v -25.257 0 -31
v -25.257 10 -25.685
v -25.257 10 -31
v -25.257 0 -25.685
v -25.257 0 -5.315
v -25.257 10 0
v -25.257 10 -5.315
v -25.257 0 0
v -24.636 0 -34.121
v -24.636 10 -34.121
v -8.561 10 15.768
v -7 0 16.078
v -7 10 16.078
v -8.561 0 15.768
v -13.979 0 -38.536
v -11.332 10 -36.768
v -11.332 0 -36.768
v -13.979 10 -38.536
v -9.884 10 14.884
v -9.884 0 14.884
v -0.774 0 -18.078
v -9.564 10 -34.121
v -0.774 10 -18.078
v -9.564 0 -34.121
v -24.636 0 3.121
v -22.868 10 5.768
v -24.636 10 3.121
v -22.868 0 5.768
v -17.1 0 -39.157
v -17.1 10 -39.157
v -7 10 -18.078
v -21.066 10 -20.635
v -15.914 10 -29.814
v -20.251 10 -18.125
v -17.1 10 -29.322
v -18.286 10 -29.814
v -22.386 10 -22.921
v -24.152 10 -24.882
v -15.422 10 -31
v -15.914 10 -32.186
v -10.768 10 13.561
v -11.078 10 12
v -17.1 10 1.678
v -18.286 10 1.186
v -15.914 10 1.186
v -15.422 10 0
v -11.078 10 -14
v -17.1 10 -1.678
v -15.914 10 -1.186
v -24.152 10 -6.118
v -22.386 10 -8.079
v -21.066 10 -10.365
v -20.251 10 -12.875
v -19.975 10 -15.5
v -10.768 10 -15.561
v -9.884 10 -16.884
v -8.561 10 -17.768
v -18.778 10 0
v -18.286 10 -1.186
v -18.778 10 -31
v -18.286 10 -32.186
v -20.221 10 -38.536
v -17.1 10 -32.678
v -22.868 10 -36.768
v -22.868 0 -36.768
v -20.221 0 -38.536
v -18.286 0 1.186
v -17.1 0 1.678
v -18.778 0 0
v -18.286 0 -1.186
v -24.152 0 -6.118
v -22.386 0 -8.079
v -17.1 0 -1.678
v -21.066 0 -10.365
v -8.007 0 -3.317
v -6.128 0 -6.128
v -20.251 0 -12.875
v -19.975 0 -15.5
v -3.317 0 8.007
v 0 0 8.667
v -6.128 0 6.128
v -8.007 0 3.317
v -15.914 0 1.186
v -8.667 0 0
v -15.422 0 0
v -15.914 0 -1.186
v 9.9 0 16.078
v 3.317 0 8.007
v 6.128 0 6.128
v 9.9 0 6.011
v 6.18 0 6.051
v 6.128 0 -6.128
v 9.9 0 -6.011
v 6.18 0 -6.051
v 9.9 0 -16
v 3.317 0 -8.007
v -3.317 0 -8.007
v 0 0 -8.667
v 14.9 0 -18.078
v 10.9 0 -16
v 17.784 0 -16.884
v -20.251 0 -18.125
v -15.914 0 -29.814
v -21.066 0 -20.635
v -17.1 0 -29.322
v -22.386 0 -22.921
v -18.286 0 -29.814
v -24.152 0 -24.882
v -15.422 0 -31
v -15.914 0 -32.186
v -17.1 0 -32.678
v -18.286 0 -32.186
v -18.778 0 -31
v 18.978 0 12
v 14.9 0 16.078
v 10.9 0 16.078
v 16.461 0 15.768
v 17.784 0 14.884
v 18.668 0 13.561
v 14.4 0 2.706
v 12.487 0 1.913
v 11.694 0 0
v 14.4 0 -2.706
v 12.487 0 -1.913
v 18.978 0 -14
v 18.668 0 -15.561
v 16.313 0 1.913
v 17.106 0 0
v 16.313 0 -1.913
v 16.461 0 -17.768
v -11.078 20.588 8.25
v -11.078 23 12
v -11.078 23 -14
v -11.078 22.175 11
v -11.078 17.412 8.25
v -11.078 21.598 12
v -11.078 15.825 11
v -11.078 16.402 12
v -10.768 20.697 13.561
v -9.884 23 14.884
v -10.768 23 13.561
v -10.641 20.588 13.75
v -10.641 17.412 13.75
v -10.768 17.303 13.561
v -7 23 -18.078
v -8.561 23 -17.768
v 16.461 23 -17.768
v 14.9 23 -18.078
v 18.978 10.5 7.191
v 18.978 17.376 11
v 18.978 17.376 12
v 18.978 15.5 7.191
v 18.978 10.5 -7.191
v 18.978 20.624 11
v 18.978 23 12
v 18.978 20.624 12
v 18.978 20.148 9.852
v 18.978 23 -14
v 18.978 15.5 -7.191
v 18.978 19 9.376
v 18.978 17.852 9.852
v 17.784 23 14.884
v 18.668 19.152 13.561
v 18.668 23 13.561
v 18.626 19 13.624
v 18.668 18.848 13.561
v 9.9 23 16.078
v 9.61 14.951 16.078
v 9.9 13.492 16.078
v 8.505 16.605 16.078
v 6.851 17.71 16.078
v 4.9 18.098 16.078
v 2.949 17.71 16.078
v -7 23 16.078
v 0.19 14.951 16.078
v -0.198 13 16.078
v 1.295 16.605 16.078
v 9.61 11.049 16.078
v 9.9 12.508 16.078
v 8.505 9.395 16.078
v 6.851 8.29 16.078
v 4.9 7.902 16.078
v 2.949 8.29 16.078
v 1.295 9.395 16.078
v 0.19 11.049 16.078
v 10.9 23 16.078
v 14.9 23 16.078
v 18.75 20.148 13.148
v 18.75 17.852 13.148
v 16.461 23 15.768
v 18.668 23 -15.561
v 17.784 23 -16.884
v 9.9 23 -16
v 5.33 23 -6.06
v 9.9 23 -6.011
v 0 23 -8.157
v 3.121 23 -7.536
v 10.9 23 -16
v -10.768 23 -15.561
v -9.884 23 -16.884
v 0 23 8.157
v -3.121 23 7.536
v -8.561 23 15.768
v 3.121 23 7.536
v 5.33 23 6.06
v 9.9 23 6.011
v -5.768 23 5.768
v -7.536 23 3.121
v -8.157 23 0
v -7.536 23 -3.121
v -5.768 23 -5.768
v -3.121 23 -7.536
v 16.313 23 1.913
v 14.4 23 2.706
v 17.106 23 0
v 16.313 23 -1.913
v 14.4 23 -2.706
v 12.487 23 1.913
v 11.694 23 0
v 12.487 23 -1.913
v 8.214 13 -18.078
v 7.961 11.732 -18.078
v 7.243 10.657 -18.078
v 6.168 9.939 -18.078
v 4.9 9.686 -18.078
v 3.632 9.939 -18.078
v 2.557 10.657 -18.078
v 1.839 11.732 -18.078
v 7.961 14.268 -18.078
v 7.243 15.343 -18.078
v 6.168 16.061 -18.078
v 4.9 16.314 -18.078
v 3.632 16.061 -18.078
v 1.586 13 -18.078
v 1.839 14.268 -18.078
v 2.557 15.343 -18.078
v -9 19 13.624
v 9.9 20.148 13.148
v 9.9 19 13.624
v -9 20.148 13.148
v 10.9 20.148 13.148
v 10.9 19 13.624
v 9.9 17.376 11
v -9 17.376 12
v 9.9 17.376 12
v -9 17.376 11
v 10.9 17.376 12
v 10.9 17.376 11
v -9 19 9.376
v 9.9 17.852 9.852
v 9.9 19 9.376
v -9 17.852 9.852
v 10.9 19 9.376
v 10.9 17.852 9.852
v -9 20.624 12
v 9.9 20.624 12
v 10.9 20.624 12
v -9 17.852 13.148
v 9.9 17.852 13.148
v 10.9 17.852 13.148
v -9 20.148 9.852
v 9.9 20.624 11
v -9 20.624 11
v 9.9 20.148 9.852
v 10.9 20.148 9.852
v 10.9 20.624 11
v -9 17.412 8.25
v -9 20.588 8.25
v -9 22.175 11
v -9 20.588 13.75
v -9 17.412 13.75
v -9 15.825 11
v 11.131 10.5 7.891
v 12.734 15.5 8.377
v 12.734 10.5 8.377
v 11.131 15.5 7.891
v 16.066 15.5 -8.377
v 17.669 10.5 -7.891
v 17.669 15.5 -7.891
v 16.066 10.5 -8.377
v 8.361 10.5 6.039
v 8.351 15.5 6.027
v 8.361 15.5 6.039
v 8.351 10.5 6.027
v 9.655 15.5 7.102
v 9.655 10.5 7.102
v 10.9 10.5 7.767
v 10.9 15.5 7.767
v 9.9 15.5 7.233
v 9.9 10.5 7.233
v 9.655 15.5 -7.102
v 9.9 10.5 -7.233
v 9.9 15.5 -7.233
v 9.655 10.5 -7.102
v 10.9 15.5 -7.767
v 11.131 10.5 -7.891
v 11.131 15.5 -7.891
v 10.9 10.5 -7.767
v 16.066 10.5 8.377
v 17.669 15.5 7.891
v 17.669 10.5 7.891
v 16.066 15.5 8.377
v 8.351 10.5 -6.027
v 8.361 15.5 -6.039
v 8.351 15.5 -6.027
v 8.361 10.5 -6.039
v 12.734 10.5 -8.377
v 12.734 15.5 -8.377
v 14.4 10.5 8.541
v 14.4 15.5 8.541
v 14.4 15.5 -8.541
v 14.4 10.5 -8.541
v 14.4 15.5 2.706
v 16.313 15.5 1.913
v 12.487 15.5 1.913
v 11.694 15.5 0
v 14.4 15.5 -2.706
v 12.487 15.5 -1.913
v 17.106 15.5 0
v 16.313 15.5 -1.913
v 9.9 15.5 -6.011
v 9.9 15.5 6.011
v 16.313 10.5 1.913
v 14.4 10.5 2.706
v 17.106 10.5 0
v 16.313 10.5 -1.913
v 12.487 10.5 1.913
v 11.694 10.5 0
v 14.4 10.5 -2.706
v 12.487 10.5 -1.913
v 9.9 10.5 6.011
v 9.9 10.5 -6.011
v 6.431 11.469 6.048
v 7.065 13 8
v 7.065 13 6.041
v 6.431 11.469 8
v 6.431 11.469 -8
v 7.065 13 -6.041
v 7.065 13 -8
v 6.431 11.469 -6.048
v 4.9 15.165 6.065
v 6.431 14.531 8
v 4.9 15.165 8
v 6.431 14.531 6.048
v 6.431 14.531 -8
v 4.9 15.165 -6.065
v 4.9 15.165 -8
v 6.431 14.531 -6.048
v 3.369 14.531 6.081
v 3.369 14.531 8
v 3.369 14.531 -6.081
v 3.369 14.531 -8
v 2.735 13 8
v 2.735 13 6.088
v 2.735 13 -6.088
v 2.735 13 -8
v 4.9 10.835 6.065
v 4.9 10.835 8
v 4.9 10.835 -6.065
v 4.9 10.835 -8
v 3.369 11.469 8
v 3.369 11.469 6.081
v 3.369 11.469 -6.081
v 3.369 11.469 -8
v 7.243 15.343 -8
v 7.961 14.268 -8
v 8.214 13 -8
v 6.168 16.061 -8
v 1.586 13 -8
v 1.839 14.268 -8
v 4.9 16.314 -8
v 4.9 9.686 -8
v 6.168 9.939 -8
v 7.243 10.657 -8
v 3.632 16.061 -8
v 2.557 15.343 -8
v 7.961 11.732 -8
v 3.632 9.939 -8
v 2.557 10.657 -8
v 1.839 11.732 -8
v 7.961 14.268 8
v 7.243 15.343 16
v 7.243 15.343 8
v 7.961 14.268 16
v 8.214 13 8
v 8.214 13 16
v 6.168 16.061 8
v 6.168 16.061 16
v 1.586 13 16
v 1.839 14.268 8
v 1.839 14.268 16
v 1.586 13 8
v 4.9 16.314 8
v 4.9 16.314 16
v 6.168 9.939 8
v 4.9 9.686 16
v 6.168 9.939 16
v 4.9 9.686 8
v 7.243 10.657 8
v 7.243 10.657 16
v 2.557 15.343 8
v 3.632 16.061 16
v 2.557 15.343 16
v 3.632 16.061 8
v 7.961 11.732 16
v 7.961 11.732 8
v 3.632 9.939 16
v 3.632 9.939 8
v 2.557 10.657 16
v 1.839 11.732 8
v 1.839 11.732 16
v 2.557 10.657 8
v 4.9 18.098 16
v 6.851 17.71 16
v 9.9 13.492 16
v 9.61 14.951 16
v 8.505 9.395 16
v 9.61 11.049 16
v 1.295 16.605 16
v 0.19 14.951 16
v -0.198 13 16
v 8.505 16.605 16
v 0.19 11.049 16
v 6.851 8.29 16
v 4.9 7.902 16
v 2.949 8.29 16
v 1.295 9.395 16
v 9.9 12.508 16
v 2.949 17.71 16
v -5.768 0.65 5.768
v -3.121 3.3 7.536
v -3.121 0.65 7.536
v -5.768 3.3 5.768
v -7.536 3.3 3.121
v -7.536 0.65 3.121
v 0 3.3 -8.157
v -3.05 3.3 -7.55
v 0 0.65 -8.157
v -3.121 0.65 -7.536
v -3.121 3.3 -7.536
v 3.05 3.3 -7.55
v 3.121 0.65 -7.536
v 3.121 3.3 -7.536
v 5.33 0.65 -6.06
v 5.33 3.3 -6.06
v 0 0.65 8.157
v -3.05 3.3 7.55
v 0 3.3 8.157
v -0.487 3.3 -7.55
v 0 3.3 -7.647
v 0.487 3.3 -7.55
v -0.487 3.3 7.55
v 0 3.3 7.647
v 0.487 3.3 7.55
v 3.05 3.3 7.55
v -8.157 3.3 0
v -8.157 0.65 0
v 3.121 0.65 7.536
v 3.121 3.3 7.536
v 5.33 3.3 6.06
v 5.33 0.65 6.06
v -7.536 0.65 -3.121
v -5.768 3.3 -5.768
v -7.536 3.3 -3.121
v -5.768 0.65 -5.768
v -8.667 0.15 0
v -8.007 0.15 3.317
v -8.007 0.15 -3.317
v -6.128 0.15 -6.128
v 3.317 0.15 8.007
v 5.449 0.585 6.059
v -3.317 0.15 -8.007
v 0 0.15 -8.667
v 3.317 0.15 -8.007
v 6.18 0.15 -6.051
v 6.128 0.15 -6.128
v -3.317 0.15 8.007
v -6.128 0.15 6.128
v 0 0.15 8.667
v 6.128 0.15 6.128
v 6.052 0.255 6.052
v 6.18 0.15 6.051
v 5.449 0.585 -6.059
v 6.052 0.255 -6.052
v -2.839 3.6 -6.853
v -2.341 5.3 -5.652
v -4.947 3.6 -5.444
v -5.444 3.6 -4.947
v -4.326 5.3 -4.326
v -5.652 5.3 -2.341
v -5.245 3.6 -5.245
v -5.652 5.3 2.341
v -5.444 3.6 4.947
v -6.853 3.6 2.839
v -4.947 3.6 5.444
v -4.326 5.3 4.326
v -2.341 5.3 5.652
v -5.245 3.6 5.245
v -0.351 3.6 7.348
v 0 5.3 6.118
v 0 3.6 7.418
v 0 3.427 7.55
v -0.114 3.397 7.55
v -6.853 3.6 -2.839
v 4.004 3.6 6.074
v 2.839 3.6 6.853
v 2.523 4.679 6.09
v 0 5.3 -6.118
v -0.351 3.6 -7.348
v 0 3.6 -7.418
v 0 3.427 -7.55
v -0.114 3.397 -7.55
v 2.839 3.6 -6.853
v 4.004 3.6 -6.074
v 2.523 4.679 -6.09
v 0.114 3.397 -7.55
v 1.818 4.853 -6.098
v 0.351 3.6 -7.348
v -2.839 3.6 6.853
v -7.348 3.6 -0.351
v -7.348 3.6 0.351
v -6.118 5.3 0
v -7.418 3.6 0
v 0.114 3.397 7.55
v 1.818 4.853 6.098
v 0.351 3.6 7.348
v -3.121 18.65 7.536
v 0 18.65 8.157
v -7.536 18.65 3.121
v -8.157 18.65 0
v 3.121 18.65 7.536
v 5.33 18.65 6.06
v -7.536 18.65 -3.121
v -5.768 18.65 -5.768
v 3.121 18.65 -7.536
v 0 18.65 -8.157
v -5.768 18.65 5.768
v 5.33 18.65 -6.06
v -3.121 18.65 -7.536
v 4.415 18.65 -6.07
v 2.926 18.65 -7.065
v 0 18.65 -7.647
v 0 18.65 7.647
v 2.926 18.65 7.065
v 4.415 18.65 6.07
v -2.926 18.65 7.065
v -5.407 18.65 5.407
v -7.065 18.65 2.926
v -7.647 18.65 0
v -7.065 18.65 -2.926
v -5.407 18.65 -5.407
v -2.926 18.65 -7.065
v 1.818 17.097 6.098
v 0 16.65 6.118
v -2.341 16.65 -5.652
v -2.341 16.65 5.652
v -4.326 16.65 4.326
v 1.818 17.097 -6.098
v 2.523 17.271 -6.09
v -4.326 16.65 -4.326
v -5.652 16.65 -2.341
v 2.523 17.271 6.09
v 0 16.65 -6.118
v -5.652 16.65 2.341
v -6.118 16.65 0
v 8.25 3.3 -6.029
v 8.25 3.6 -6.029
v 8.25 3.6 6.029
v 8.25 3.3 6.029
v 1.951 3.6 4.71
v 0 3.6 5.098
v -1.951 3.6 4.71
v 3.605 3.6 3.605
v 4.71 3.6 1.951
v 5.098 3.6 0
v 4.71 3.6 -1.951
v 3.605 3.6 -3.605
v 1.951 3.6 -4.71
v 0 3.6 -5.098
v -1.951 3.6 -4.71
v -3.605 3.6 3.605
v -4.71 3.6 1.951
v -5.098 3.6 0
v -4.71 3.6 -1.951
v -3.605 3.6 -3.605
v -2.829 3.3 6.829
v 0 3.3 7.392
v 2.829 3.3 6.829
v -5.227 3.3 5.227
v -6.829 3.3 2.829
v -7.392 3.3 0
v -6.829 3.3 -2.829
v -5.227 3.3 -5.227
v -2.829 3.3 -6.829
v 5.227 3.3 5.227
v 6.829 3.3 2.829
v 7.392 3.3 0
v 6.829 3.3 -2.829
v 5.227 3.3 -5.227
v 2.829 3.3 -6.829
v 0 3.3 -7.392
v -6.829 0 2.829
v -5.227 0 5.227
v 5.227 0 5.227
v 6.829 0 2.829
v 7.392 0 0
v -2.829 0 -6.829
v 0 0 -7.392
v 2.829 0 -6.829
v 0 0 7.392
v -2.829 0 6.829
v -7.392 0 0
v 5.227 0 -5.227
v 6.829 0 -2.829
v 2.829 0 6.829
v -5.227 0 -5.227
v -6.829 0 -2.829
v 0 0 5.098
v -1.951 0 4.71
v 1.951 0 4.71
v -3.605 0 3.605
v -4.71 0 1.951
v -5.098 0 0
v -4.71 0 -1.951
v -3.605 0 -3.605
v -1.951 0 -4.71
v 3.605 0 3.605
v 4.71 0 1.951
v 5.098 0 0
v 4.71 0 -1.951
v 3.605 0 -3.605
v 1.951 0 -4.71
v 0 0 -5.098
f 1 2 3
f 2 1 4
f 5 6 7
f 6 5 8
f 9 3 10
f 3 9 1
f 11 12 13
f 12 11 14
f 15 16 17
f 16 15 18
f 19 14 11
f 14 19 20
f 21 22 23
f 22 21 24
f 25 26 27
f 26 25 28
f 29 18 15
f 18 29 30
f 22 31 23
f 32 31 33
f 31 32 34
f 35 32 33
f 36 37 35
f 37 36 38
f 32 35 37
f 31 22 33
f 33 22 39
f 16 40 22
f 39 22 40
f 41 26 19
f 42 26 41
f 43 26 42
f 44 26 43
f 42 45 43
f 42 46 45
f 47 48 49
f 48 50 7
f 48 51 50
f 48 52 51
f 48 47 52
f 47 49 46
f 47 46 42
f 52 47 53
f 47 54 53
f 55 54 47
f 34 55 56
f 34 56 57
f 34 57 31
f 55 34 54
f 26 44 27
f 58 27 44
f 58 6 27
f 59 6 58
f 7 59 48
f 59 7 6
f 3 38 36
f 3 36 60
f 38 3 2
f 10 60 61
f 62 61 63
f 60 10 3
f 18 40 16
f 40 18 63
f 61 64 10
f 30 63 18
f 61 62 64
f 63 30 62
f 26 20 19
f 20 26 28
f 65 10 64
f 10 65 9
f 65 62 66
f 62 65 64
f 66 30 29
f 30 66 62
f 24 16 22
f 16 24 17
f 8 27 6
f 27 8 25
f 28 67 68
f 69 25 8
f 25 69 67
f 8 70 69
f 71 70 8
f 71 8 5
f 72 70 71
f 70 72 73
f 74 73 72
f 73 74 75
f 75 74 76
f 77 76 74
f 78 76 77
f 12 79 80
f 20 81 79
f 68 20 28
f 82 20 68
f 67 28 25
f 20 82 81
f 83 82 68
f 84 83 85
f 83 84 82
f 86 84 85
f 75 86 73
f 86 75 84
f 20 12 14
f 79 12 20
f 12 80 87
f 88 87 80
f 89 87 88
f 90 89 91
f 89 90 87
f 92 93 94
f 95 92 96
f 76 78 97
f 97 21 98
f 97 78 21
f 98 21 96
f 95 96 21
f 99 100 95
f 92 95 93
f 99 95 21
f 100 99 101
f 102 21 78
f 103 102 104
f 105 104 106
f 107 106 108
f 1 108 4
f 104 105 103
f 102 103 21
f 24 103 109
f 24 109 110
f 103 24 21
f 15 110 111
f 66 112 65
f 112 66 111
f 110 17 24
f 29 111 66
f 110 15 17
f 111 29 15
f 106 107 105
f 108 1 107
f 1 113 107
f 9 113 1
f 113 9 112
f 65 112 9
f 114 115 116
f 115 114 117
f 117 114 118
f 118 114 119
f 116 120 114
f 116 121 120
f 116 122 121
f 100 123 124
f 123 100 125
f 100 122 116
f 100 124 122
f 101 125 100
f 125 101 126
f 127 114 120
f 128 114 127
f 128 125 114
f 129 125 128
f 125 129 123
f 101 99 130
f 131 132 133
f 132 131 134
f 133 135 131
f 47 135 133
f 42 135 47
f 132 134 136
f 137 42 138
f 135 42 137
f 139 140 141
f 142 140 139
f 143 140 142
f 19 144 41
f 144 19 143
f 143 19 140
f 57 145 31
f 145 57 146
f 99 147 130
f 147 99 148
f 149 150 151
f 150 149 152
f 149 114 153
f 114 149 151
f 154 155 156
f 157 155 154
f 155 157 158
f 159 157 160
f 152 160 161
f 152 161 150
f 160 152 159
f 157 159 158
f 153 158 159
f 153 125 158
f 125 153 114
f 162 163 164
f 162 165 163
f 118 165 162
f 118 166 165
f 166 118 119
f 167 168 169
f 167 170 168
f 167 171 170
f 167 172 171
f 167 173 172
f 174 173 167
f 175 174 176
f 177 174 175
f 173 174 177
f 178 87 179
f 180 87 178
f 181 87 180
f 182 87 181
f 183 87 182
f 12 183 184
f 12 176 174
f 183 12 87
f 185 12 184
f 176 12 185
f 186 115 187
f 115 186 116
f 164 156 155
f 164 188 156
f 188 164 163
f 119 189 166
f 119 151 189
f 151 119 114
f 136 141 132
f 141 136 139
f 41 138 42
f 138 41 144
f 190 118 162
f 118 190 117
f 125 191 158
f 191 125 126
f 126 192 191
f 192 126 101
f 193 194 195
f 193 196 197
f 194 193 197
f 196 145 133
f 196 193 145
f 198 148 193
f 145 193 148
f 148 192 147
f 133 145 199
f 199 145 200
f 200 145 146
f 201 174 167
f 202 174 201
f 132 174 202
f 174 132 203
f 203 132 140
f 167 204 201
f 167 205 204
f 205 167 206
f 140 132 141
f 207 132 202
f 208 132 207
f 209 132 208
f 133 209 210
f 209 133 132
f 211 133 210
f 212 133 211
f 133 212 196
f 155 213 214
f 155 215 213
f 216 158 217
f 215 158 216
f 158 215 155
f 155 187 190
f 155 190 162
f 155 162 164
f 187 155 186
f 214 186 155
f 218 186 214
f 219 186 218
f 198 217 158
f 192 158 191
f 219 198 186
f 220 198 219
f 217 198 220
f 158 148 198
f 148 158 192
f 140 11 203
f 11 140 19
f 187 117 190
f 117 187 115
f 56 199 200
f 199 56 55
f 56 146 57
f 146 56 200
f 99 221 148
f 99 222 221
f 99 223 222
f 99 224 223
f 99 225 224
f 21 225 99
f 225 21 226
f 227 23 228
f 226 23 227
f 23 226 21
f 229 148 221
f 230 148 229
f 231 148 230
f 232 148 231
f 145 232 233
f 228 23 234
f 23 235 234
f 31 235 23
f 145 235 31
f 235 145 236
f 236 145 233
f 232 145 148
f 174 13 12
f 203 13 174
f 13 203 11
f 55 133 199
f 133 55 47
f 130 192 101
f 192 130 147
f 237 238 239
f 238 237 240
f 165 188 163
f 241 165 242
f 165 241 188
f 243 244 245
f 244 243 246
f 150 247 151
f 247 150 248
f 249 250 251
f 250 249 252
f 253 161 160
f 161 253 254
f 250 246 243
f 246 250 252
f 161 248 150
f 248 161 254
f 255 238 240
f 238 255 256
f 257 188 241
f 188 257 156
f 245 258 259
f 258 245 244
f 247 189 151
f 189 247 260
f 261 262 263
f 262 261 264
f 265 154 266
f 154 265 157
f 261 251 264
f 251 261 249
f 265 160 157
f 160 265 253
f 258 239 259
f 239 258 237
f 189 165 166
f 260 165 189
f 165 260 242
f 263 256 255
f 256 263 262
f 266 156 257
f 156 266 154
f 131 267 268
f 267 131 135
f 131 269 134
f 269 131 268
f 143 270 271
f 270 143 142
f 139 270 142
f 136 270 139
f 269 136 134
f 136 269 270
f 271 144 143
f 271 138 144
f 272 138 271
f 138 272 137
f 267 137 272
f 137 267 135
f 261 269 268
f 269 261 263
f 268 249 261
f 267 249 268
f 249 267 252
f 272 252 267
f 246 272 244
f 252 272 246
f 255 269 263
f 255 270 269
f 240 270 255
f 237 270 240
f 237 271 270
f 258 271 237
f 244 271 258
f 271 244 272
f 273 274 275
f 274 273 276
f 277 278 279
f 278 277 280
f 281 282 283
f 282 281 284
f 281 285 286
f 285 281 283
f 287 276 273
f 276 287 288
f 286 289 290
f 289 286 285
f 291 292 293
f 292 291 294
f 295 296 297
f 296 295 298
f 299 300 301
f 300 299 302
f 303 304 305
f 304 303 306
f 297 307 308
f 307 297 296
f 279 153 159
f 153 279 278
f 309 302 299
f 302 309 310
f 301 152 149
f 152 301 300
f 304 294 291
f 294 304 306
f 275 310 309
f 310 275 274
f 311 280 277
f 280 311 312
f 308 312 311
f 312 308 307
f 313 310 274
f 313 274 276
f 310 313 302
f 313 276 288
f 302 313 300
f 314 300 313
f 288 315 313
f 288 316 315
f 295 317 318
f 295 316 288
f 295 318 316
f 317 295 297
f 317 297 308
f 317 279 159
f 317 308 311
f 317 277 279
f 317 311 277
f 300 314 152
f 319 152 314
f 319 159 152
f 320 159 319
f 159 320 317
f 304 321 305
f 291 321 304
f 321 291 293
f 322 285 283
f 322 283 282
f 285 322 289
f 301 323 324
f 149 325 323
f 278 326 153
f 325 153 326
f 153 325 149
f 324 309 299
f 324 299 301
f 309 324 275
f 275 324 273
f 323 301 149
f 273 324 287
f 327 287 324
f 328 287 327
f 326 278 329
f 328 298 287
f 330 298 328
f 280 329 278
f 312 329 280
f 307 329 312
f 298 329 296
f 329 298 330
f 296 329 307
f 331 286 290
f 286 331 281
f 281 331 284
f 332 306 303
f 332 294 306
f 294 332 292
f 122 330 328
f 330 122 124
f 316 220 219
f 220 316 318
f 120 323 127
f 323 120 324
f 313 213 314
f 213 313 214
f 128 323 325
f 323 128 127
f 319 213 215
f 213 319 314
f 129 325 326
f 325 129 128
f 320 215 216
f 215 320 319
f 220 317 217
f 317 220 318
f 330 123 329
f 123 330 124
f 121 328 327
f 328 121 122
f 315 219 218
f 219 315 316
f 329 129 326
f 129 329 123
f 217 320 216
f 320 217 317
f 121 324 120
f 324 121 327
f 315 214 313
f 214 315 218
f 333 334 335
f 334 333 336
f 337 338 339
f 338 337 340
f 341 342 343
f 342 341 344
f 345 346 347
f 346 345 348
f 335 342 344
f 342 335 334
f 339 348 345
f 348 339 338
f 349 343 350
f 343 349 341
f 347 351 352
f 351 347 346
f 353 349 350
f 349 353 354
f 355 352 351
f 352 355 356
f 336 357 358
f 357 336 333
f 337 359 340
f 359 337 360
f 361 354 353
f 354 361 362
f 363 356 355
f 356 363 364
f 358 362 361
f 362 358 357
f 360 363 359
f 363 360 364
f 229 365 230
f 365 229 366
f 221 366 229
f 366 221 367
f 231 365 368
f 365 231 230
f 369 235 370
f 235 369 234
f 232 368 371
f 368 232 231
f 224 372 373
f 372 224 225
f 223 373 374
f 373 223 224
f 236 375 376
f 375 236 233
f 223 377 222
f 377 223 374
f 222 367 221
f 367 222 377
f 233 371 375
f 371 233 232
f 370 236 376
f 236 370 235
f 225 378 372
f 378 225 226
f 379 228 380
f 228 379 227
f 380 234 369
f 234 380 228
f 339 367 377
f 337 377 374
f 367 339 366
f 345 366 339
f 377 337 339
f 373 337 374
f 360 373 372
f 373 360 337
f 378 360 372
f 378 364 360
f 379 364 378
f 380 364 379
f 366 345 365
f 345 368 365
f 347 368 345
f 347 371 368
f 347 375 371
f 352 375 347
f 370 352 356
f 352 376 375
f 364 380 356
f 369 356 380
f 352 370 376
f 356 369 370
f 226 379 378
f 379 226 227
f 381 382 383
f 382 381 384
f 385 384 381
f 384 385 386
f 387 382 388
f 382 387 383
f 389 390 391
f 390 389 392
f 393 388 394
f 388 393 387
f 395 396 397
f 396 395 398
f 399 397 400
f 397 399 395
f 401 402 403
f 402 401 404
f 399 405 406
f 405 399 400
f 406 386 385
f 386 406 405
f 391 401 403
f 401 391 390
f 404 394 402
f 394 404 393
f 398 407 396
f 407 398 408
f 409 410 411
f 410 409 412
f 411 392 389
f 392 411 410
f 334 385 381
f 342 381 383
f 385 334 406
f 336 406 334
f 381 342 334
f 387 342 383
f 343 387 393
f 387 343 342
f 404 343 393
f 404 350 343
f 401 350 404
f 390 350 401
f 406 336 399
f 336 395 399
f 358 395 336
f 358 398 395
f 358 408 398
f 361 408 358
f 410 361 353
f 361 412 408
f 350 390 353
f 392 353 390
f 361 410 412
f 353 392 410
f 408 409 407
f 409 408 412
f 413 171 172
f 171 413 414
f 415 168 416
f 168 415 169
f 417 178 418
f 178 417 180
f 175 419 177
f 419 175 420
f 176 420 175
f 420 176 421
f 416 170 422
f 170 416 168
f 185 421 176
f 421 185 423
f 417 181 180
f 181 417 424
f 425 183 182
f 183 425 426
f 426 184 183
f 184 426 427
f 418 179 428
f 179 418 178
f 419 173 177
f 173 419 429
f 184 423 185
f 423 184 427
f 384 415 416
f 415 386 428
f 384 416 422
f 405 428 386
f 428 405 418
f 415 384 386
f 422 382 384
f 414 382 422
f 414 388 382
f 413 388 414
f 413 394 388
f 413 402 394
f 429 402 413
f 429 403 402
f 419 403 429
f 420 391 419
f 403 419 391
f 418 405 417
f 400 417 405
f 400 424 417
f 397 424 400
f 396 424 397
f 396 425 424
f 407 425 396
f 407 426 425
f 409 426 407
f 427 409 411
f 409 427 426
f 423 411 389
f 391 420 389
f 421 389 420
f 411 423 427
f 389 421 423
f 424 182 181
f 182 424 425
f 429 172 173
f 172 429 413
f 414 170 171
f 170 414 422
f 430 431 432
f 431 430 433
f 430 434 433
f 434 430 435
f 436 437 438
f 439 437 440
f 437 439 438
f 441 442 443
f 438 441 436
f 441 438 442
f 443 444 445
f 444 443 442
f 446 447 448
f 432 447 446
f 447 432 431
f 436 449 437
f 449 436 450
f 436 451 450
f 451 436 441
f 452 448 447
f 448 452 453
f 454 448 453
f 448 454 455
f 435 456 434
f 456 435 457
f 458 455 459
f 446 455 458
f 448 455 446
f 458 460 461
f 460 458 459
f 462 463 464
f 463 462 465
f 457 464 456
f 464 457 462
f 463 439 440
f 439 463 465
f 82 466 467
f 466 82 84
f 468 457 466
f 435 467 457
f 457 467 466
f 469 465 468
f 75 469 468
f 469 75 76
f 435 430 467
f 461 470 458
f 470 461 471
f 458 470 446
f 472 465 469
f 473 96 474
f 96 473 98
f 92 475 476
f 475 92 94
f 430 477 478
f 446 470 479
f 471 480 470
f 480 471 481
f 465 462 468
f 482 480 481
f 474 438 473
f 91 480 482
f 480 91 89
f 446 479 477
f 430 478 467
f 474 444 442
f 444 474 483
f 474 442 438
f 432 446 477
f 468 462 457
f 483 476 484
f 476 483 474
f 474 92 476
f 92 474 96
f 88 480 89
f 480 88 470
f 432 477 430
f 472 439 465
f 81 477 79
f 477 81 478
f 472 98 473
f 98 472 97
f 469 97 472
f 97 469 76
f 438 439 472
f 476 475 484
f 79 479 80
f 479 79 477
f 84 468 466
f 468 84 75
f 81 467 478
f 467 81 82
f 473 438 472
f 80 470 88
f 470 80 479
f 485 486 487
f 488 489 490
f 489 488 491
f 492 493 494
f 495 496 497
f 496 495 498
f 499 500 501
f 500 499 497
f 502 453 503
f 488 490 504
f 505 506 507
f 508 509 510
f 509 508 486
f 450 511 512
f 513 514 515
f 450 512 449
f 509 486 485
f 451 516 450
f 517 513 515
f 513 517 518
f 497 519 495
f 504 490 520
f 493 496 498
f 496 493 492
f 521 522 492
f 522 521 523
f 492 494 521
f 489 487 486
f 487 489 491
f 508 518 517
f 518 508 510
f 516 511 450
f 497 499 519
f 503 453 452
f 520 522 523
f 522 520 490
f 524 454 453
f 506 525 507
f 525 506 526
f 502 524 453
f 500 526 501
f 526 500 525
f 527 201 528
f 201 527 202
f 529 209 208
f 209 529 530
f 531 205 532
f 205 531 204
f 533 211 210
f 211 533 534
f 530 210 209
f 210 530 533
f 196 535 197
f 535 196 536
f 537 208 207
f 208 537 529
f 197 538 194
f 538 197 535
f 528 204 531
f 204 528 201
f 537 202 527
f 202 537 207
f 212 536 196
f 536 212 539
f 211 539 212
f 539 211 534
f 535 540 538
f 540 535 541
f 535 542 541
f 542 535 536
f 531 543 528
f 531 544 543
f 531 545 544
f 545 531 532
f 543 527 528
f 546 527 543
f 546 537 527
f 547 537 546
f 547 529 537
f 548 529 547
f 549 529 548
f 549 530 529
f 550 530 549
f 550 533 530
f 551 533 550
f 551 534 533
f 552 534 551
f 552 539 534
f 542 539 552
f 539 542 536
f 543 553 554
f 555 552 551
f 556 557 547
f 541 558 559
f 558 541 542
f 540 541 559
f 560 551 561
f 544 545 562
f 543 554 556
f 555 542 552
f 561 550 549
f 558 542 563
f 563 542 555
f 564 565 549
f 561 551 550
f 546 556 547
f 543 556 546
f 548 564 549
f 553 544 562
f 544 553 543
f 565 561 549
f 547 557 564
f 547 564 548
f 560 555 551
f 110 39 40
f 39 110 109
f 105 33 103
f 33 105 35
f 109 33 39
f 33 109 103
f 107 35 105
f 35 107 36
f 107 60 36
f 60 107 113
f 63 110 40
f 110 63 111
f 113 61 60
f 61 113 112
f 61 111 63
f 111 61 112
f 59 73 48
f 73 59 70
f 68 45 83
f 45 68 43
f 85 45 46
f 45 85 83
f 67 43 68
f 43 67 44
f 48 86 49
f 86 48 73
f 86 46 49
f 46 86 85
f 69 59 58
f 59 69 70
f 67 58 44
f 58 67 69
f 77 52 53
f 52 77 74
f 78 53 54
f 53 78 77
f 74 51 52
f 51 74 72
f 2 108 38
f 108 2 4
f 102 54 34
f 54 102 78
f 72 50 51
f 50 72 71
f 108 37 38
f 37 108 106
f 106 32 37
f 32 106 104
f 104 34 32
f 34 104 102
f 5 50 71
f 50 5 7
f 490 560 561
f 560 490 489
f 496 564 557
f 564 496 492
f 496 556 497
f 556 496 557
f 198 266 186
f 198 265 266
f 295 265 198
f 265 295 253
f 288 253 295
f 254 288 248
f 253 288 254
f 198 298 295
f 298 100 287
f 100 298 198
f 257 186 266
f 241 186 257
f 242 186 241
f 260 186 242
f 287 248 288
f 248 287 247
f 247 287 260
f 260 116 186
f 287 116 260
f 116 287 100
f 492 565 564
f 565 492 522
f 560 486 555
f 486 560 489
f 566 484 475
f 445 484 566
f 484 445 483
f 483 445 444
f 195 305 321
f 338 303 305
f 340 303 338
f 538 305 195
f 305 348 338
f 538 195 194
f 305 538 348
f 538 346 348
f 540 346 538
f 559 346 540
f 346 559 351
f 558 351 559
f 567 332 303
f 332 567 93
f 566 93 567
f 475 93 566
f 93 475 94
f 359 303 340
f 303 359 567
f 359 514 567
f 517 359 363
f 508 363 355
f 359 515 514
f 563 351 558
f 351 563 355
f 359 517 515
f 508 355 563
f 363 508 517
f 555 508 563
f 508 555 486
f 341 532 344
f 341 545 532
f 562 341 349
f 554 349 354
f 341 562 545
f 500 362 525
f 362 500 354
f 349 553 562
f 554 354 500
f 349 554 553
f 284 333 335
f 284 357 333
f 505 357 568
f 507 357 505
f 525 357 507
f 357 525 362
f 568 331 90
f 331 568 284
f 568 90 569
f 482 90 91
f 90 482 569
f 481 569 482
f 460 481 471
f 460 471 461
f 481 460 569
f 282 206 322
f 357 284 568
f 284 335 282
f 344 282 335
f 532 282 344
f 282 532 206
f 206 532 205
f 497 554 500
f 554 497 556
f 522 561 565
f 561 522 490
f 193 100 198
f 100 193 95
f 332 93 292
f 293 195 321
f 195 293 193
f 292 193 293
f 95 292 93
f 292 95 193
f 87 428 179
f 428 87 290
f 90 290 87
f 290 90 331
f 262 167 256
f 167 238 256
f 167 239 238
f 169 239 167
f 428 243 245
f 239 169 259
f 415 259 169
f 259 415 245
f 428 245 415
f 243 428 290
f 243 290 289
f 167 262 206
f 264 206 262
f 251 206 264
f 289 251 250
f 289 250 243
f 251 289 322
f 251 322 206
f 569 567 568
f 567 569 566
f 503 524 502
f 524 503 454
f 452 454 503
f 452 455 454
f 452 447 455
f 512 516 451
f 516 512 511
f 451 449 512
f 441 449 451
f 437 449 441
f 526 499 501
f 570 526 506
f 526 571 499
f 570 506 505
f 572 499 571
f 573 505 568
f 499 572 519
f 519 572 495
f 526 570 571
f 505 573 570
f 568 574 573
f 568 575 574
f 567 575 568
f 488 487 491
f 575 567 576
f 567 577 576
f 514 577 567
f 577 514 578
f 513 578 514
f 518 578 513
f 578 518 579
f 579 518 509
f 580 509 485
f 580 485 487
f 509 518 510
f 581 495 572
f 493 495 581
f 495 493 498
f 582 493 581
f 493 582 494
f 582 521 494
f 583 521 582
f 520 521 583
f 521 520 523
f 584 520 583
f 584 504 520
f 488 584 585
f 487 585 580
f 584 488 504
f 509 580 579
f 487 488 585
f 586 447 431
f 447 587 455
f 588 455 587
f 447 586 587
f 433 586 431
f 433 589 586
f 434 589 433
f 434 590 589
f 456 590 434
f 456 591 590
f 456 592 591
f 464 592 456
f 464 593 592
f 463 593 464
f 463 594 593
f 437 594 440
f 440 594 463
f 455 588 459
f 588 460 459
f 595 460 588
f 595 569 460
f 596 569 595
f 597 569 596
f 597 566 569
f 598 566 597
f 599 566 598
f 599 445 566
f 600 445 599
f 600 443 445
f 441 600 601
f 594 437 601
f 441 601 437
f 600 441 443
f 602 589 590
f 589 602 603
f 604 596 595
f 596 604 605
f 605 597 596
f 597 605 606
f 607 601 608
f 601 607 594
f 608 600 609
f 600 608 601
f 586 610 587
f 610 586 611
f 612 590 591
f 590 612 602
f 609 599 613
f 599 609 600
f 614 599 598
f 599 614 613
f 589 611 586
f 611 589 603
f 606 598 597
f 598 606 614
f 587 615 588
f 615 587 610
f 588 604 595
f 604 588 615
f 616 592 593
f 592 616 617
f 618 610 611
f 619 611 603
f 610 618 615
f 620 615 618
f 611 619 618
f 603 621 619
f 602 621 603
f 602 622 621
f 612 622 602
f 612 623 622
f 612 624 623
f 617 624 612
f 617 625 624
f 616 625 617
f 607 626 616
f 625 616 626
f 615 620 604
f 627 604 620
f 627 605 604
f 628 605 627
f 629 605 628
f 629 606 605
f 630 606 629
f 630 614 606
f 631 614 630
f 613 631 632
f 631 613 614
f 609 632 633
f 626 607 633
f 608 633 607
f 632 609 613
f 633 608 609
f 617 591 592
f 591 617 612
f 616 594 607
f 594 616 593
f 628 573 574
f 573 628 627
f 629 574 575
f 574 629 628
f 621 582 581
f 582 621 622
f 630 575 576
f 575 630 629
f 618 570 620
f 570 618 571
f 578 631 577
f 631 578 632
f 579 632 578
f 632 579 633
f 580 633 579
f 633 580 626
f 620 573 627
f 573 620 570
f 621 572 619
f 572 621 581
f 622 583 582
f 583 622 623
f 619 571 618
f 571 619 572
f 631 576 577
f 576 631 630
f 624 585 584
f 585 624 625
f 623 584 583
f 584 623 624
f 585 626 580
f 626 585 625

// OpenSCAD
// file: inc/spur_generator.scad
// Copyright 2011 Cliff L. Biffle.
// This file is licensed Creative Commons Attribution-ShareAlike 3.0.
// http://creativecommons.org/licenses/by-sa/3.0/

// You can get this file from http://www.thingiverse.com/thing:3575
use <parametric_involute_gear_v5.0.scad>

// Couple handy arithmetic shortcuts
function sqr(n) = pow(n, 2);
function cube(n) = pow(n, 3);

// This was derived as follows:
// In Greg Frost's original script, the outer radius of a spur
// gear can be computed as...
function gear_outer_radius(number_of_teeth, circular_pitch) =
  (sqr(number_of_teeth) * sqr(circular_pitch) + 64800)
    / (360 * number_of_teeth * circular_pitch);

// We can fit gears to the spacing by working it backwards.
//  spacing = gear_outer_radius(teeth1, cp)
//          + gear_outer_radius(teeth2, cp);
//
// I plugged this into an algebra system, assuming that spacing,
// teeth1, and teeth2 are given.  By solving for circular pitch,
// we get this terrifying equation:
function fit_spur_gears(n1, n2, spacing) =
  (180 * spacing * n1 * n2  +  180
    * sqrt(-(2*n1*cube(n2)-(sqr(spacing)-4)*sqr(n1)*sqr(n2)+2*cube(n1)*n2)))
  / (n1*sqr(n2) + sqr(n1)*n2);
// file: gears.scad
use <util.scad>;

da6 = 1 / cos(180 / 6) / 2;
da8 = 1 / cos(180 / 8) / 2;

// Copyright 2011 Cliff L. Biffle.
// This file is licensed Creative Commons Attribution-ShareAlike 3.0.
// http://creativecommons.org/licenses/by-sa/3.0/

// You can get this file from http://www.thingiverse.com/thing:3575
include <config.scad>
include <positions.scad>
use <inc/parametric_involute_gear_v5.0.scad>
use <inc/spur_generator.scad>

//include <configuration.scad>
//include <positions.scad>

// M6
ext_shaft_diam = 6;
ext_shaft_nut_diam = 10;
ext_shaft_nut_height = 4.5;

// M5
ext_shaft_diam = 5;
ext_shaft_nut_diam = 8.1;
ext_shaft_nut_height = 3.5;

// Here's an example.
large_tooth_num = 49;
small_tooth_num = 9;
/* use this ratio for NEMA17?
*/
large_tooth_num = 38;
small_tooth_num = 13;
// printed 51 and 9
// 7 and 41
// 9 and 41
// 11 and 49
gear_pitch = fit_spur_gears(large_tooth_num, small_tooth_num, gear_dist);

small_tooth_height = 7;
small_gear_height  = 15;

large_gear_thickness = small_tooth_height+ext_shaft_nut_height/2;

module large_gear() {
  difference() {
    // Simple Test:
    gear (circular_pitch=gear_pitch,
      gear_thickness = large_gear_thickness,
      rim_thickness = large_gear_thickness,
      rim_width = 3,
      //hub_thickness = 17,
      hub_thickness = 0, //large_gear_thickness-0.5+ext_shaft_nut_height,
      hub_diameter = ext_shaft_nut_diam + 7,
      number_of_teeth = large_tooth_num,
      circles=4,
      bore_diameter = 0);
    cylinder(r=ext_shaft_diam/2,$fn=36,h=50,center=true);
    translate([0,0,large_gear_thickness-ext_shaft_nut_height/2]) {
      //cylinder(r=da6*ext_shaft_nut_diam,h=ext_shaft_nut_height*2,center=true,$fn=6); // nut trap for m6 nut
      hole(ext_shaft_nut_diam,ext_shaft_nut_height*2,6); // nut trap for m6 nut
    }
  }
}

module small_gear() {
  set_screw_nut_diam = 6;
  difference() {
    gear (
      circular_pitch  = gear_pitch,
      gear_thickness  = small_tooth_height,
      rim_thickness   = small_tooth_height,
      hub_thickness   = small_gear_height,
      circles         = 0,
      number_of_teeth = small_tooth_num,
      rim_width       = 2,
      bore_diameter   = 0,
      hub_diameter    = 21
    );

    // flatted motor hole
    difference() {
      cylinder(r=5.3/2,$fn=18,h=90,center=true);
      //% rotate([0,0,22.5]) cylinder(r=4.5*da8,$fn=8,h=90,center=true);
      //% rotate([0,0,22.5]) cylinder(r=5*da8,$fn=8,h=90,center=true);
      translate([2.65,0,0]) cube([1,10,100],center=true);
    }

    // m3 set screw
    // m3 nut == 5.5mm * 3mm
    translate([2.25,0,small_gear_height-3.5]) {
      rotate([0,90,0]) cylinder(r=set_screw_nut_diam*da6,h=5,$fn=6,center=true);
      translate([0,0,2.1]) cube([5,set_screw_nut_diam,3],center=true);
      translate([10,0,0]) rotate([90,0,0]) rotate([0,90,0]) cylinder(r=3*da6,h=20,$fn=6,center=true);
      //% translate([1.25,0,0]) rotate([0,90,0]) cylinder(r=5.5*da6,h=2.5,$fn=6,center=true);
    }
  }
}

module assembly() {
  large_gear();

  translate([gear_dist,0,0]) small_gear();
}

module plate() {
  large_gear();

  translate([gear_dist + 10,0,15]) {
    rotate([180,0,0]) small_gear();
  }
}

//plate();
assembly();
// file: positions.scad
include <config.scad>;

filament_from_carriage = hotend_diam / 2 + 8; // make sure the hotend can clear the carriage
filament_x = hobbed_diam/2 + filament_diam/2 - .6;

// bearing helps provide clearance for motor mount screws
gear_side_bearing_y = bearing_height/2-m3_socket_head_height+1;

// MR105ZZ
idler_bearing_outer     = 10;
idler_bearing_inner     = 5;
idler_bearing_thickness = 4;
idler_nut_diam          = 8;

// 625ZZ
idler_bearing_height = 5;
idler_bearing_outer  = 16;
idler_bearing_inner  = 5;
idler_nut_diam       = m5_nut_diam;

idler_width        = idler_bearing_height+14;
idler_thickness    = idler_bearing_inner+3+1;
idler_shaft_diam   = idler_bearing_inner;
idler_shaft_length = idler_width*2;
idler_x            = filament_x + idler_bearing_outer/2 + filament_diam/2;

main_body_motor_side_width = bearing_outer/2+3;
main_body_open_side_width  = idler_x + idler_shaft_diam/2 + 2;
main_body_width            = main_body_motor_side_width + main_body_open_side_width;
main_body_x                = main_body_open_side_width-main_body_width/2;

idler_screw_from_shaft       = bearing_outer/2+idler_screw_nut_diam/2+2;
main_body_idler_side_height  = idler_screw_from_shaft + idler_screw_nut_diam/2 + min_material_thickness*2;
main_body_idler_side_height  = bearing_outer/2 + 2 + 4 + 2;
main_body_hotend_side_height = bearing_outer/2 + 10;
main_body_height             = main_body_idler_side_height + main_body_hotend_side_height;
main_body_z                  = main_body_idler_side_height - main_body_height/2;

hotend_retainer_width_motor_side = main_body_motor_side_width + abs(filament_x);
hotend_retainer_diam             = hotend_diam + min_material_thickness*2;
hotend_retainer_width_idler_side = hotend_retainer_diam/2;
hotend_retainer_width            = hotend_retainer_width_idler_side + hotend_retainer_width_motor_side;

hotend_retainer_height           = hotend_height_above_groove + hotend_groove_height;
hotend_retainer_x                = filament_x - hotend_retainer_width_motor_side + hotend_retainer_width/2;
hotend_retainer_z                = 0;

// motor position
motor_y = mount_plate_thickness;
motor_z = -motor_hole_spacing/2;
//motor_x = -sqrt(pow(gear_dist,2)-pow(motor_z,2));
motor_x = -1*(main_body_motor_side_width+0.1+motor_side/2);

gear_dist = sqrt(pow(abs(motor_x),2)+pow(abs(motor_z),2));

idler_screw_spacing = (idler_width - idler_bearing_height - 2);

idler_lower_half = 0;
idler_upper_half = idler_screw_from_shaft+idler_screw_diam/2+3;
idler_thumb_lever_thickness = 3;
idler_thumb_lever_length = 6;

bowden_retainer_clip_outer = 12;

filament_y   = mount_plate_thickness + filament_diam;
total_depth  = filament_y + idler_bearing_height * 2;
total_height = motor_side + bottom_thickness;

idler_gap_width = 1;
idler_height    = main_body_height - 1;
idler_gap_x     = idler_x - idler_shaft_diam/2 - 1 - idler_gap_width/2;
idler_gap_z     = main_body_z + main_body_height/2 - idler_height/2 + 1;
// file: config.scad
// All hail whosawhatsis
da6 = 1 / cos(180 / 6) / 2;
da8 = 1 / cos(180 / 8) / 2;

approx_pi = 3.14159;
resolution = 32;

// make coordinates more communicative
left  = -1;
right = 1;
front = -1;
rear  = 1;
top = 1;
bottom  = -1;

// address vector positions by their name
x = 0;
y = 1;
z = 2;

// Screws, nuts
m3_diam = 3.1;
m3_nut_diam  = 5.5;
m3_nut_thickness  = 3;
m3_socket_head_diam = 6;
m3_socket_head_height = 3;
m5_diam = 5;
m5_nut_diam = 8;
m5_nut_thickness = 5;
m5_bolt_head_thickness = 4;

// Motors
nema17_side = 43;
nema17_len = 36; // "half-length" nema 17
nema17_len = 48;
nema17_hole_spacing = 31;
nema17_screw_diam = m3_diam;
nema17_shaft_diam = 5;
nema17_shaft_len = 22.5 + 2;
nema17_short_shaft_len = 0;
nema17_shoulder_height = 2;
nema17_shoulder_diam = nema17_hole_spacing*.75;

nema14_side = 35.3;
nema14_len = 36;
nema14_hole_spacing = 26;
nema14_screw_diam = m3_diam;
nema14_shaft_diam = 5;
nema14_shaft_len = 20;
nema14_short_shaft_len = 20;
nema14_shoulder_height = 2;
nema14_shoulder_diam = 22;

motor_side = nema17_side;
motor_len = nema17_len;
motor_hole_spacing = nema17_hole_spacing;
motor_screw_diam = nema17_screw_diam;
motor_shaft_diam = nema17_shaft_diam;
motor_shaft_len = nema17_shaft_len;
motor_short_shaft_len = nema17_short_shaft_len;
motor_shoulder_height = nema17_shoulder_height;
motor_shoulder_diam = nema17_shoulder_diam;
motor_diam          = 51;

/*
motor_side = nema14_side;
motor_len = nema14_len;
motor_hole_spacing = nema14_hole_spacing;
motor_screw_diam = nema14_screw_diam;
motor_shaft_diam = nema14_shaft_diam;
motor_shaft_len = nema14_shaft_len;
motor_short_shaft_len = nema14_short_shaft_len;
motor_shoulder_height = nema14_shoulder_height;
motor_shoulder_diam = nema14_shoulder_diam;
*/

// Misc settings
extrusion_width = 0.5;
extrusion_height = 0.3;
min_material_thickness = extrusion_width*4;
spacer = 1;

// bearing size

// 4-40
idler_screw_diam = 3.2;
idler_screw_nut_diam = 6.8;
idler_screw_nut_thickness = 2.5;

// m3
idler_screw_diam = 3.2;
idler_screw_nut_diam = 5.7;
idler_screw_nut_thickness = 2.5;

// 608
bearing_height = 7;
bearing_outer  = 22;
bearing_inner  = 8;

// 626
bearing_height = 6;
bearing_outer  = 19;
bearing_inner  = 6;

// 625
bearing_height = 5.3;
bearing_outer  = 16;
bearing_inner  = 5;

// 608
idler_bearing_height = 7;
idler_bearing_outer  = 22;
idler_bearing_inner  = 8;

//626
idler_bearing_height = 6;
idler_bearing_outer  = 19;
idler_bearing_inner  = 6;

//625
idler_bearing_height = 5;
idler_bearing_outer  = 16;
idler_bearing_inner  = 5;

// use the same bearing as everywhere else
idler_bearing_height = bearing_height;
idler_bearing_outer  = bearing_outer;
idler_bearing_inner  = bearing_inner;

filament_diam = 3;
filament_hole_diam = filament_diam + 1;
bowden_tubing_diam = 6.5;
bowden_retainer_inner = 11;
bowden_retainer_body_diam = bowden_retainer_inner + 4;

mount_plate_thickness = 10;
bottom_thickness = m3_socket_head_diam + min_material_thickness;

ext_shaft_length  = 60;
hobbed_diam = 8;
hobbed_width = 7;
ext_shaft_diam = bearing_inner;
bearing_opening   = bearing_outer - 1;
ext_shaft_opening = hobbed_diam + 4;

carriage_hole_spacing = 30;
carriage_hole_small_diam    = m3_diam;
carriage_hole_large_diam    = 6;
carriage_hole_support_thickness = 8;

hotend_length = 63;
hotend_diam   = 16;
hotend_mount_hole_depth = 5;
hotend_mount_screw_hole_spacing = 24;
hotend_mount_screw_diam = 4;
hotend_mount_screw_nut = 7.3;
hotend_mount_length = 37.5*2;
hotend_mount_width = 28;
hotend_mount_height = 0;

hotend_height_above_groove   = 4.8;
hotend_groove_height         = 4.6;
hotend_groove_diam           = 12;
// file: util.scad
function accurate_diam(diam,sides=16) = 1 / cos(180 / sides) * diam;

module hole(diam,height,sides=16) {
  diam = accurate_diam(diam,sides);

  cylinder(r=diam/2,h=height,center=true,$fn=sides);
}
// main file
include <util.scad>
include <config.scad>
include <positions.scad>
use <gears.scad>

module motor() {
  translate([0,0,-motor_len/2]) {
    cube([motor_side,motor_side,motor_len],center=true);

    // shaft
    translate([0,0,motor_len/2+motor_shaft_len/2+motor_shoulder_height])
      cylinder(r=5/2,h=motor_shaft_len,center=true);

    // shoulder
    translate([0,0,motor_len/2+motor_shoulder_height/2])
      cylinder(r=motor_shoulder_diam/2,h=motor_shoulder_height,center=true); // shoulder

    // short shaft
    translate([0,0,-motor_len/2-motor_short_shaft_len/2])
      cylinder(r=5/2,h=motor_short_shaft_len,center=true);
  }
}

module position_motor() {
  translate([motor_x,motor_y,motor_z]) {
    rotate([90,0,0]) {
      children();
    }
  }
}

module assembly() {
  translate([0,0,0]) extruder_body();

  // motor
  % position_motor() motor();

  // extruder shaft
  % translate([0,ext_shaft_length/2-15,0]) rotate([90,0,0]) {
    hole(ext_shaft_diam,ext_shaft_length);
  }

  // hobbed whatnot
  % translate([0,filament_y,0]) rotate([90,0,0]) {
    hole(hobbed_diam,hobbed_width);
  }

  // idler bearing
  % translate([idler_x,filament_y,0]) rotate([90,0,0]) {
    hole(idler_bearing_outer,idler_bearing_thickness);
  }

  // idler bolt
  % translate([idler_x,mount_plate_thickness/2+total_depth/2,0]) rotate([90,0,0]) {
    hole(idler_bearing_inner,total_depth);
  }

  // filament
  % translate([filament_x,filament_y,0]) {
    hole(filament_diam,60);
  }

  translate([idler_x,filament_y,0.1]) {
    //idler();
  }
}

module bearing() {
  difference() {
    cylinder(r=bearing_outer/2,h=bearing_height,center=true);
    cylinder(r=bearing_inner/2,h=bearing_height+0.05,center=true);
  }
}

module gear_assembly() {
  translate([0,-2.5,0]) rotate([90,0,0]) large_gear();

  translate([-1 * gear_dist,-2,0]) {
    rotate([90,0,0]) small_gear();
  }
}

module extruder_body_base() {
  // motor plate
  rounded_diam = 8;
  hull() {
    position_motor() {
      translate([0,0,mount_plate_thickness/2]) {
        for(x=[1]) {
          for(y=[-1,1]) {
            translate([x*(motor_hole_spacing/2),y*(motor_hole_spacing/2),0]) {
              hole(rounded_diam*2,mount_plate_thickness);
            }
          }
        }
      }
    }
    // main block
    translate([main_body_x,0,main_body_z]) {
      translate([left*(main_body_width/2-rounded_diam/2),mount_plate_thickness/2,top*(main_body_height/2-rounded_diam/2)]) {
        rotate([90,0,0]) {
          hole(rounded_diam,mount_plate_thickness);
        }
      }
    }

    // idler retainer
    translate([0,mount_plate_thickness/2,0]) {
      rotate([90,0,0]) {
        hole(bearing_outer,mount_plate_thickness,resolution);
      }
    }
  }

  block_depth = total_depth - mount_plate_thickness;
  // main block
  translate([main_body_x,mount_plate_thickness+block_depth/2,main_body_z]) {
    //cube([main_body_width,block_depth,main_body_height],center=true);
  }
  hull() {
    translate([main_body_x,0,main_body_z]) {
      for(x=[-1,1]) {
        for(z=[-1,1]) {
          translate([x*(main_body_width/2-rounded_diam/2),total_depth/2,z*(main_body_height/2-rounded_diam/2)]) {
            rotate([90,0,0]) {
              hole(rounded_diam,total_depth);
            }
          }
        }
      }
    }
  }
}

module extruder_body() {
  difference() {
    extruder_body_base();
    extruder_body_holes();
  }
  color("lightblue") bridges();
}

module idler_bearing() {
  difference() {
    cylinder(r=idler_bearing_outer/2,h=idler_bearing_height,center=true);
    cylinder(r=idler_bearing_inner/2,h=idler_bearing_height*2,center=true);
  }
}

module idler() {
  difference() {
    union() {
      translate([0,0,-idler_lower_half/2])
        cube([idler_thickness,idler_width,idler_lower_half],center=true);

      translate([0,0,idler_upper_half/2])
        cube([idler_thickness,idler_width,idler_upper_half+0.05],center=true);

      translate([idler_thickness/2-idler_thumb_lever_thickness/2,0,idler_upper_half+idler_thumb_lever_length/2])
        cube([idler_thumb_lever_thickness,idler_width,idler_thumb_lever_length+0.05],center=true);
    }

    // holes for screws
    for(side=[-1,1]) {
      translate([(idler_thickness)/2,idler_screw_spacing/2*side,idler_screw_from_shaft]) {
        hull() {
          rotate([0,-85,0]) translate([0,0,(idler_thickness)/2+1]) rotate([0,0,90])
            hole(idler_screw_diam,idler_thickness+2.05,6);
          rotate([0,-95,0]) translate([0,0,(idler_thickness)/2+1]) rotate([0,0,90])
            hole(idler_screw_diam,idler_thickness+2.05,6);
        }
      }
    }

    // hole for bearing
    cube([idler_bearing_outer,idler_bearing_height+0.5,idler_bearing_outer+2],center=true);
    translate([-idler_thickness/2,0,0]) cylinder(r=(idler_bearing_height+0.5)*da8,$fn=8,h=100,center=true);

    translate([-0.5,0,0]) {
      rotate([90,0,0]) cylinder(r=da8*(idler_shaft_diam),h=idler_shaft_length,$fn=8,center=true);
      // idler bearing
      % rotate([90,0,0]) idler_bearing();
    }
  }
}

module extruder_body_holes() {
  bearing_bevel_height = bearing_opening - ext_shaft_opening;

  // shaft hole
  hull() {
    translate([0,total_depth/2,0]) rotate([90,0,0]) {
      hole(ext_shaft_opening,total_depth);
    }

    translate([idler_gap_x,total_depth/2,0]) {
      cube([idler_gap_width,total_depth+1,ext_shaft_opening],center=true);
    }
  }

  // idler tensioner
  translate([main_body_x-main_body_width/2,total_depth-4,bearing_outer/2+1.5+3/2]) {
    # hull() {
      rotate([0,90,0]) {
        hole(3,main_body_width*2+1,8);
      }
      translate([0,0,1]) {
        rotate([0,90,0]) {
          hole(3,main_body_width*2+1,8);
        }
      }
    }
    rotate([0,90,0]) {
      rotate([0,0,90]) {
        hole(5.5,4,6);
      }
    }
  }

  // idler gap
  translate([idler_gap_x,total_depth/2,idler_gap_z]) {
    cube([idler_gap_width,total_depth+1,idler_height],center=true);
  }

  // idler bearing/shaft
  translate([idler_x,filament_y,0]) {
    rotate([90,0,0]) {
      // bearing
      hole(idler_bearing_outer + 1, idler_bearing_thickness + 1, resolution);

      // shaft
      hole(idler_bearing_inner, total_depth*2, 8);
    }
  }

  // filament path
  translate([filament_x,filament_y,0]) {
    hole(filament_hole_diam,50,8);

    // Bowden tubing
    translate([0,0,-main_body_hotend_side_height]) {
      hole(bowden_tubing_diam,(main_body_hotend_side_height-ext_shaft_opening/2-2)*2);
    }
    translate([0,0,main_body_idler_side_height]) {
      hole(bowden_tubing_diam,(main_body_idler_side_height-ext_shaft_opening/2-2)*2);
    }

    // bowden clamp
    translate([0,0,main_body_z+main_body_height/2]) {
      translate([0,0,10]) {
        // hole(8,20);
      }

      hull() {
        translate([0,0,2]) {
          hole(10,4);
        }
        translate([0,0,8]) {
          translate([0,0,-1]) {
            hole(8,2);
          }
        }
      }
    }
  }

  translate([0,gear_side_bearing_y,0]) {
    // gear-side bearing
    rotate([90,0,0]) {
      hole(bearing_outer,bearing_height,16);
    }
    // bearing opening bevel
    translate([0,-1,0]) {
      hull() {
        rotate([90,0,0]) {
          hole(bearing_outer,2,16);
        }
        rotate([90,0,0]) {
          hole(bearing_outer+extrusion_width*2,1,16);
        }
      }
    }
    // bearing bevel
    hull() {
      rotate([90,0,0]) {
        hole(bearing_opening,bearing_height);
      }
      rotate([90,0,0]) {
        hole(ext_shaft_opening,bearing_height+bearing_bevel_height + 1);
      }
    }

    % translate([0,0,0]) {
      rotate([90,0,0]) {
        bearing();
      }
    }
  }

  // carriage-side filament support bearing
  translate([0,filament_y+filament_diam/2+bearing_height*2+bearing_bevel_height/2,0]) {
    rotate([90,0,0]) {
      hole(bearing_outer,bearing_height*3);
    }

    // bearing bevel
    hull() {
      rotate([90,0,0]) {
        hole(bearing_opening,bearing_height*3);
      }
      rotate([90,0,0]) {
        hole(ext_shaft_opening,bearing_height*3+bearing_bevel_height + 1);
      }
    }
  }

  // idler screw holes for idler screws
  /*
  translate([filament_x,filament_y,idler_screw_from_shaft]) {
    for (side=[-1,1]) {
      translate([0,idler_screw_spacing/2*side,0]) rotate([0,90,0])
        rotate([0,0,90]) {
          hole(idler_screw_diam,45,6);
        }
    }
  }

  // captive nut recesses for idler screws
  translate([-2.5,filament_y,idler_screw_from_shaft]) {
    for (side=[-1,1]) {
      translate([0,idler_screw_spacing/2*side,0]) rotate([0,90,0]) rotate([0,0,90])
        hole(idler_screw_nut_diam,idler_screw_nut_thickness+spacer*1.5,6);
      translate([0,idler_screw_spacing/2*side,5])
        cube([idler_screw_nut_thickness+spacer*1.5,idler_screw_nut_diam,10],center=true);
    }
  }
  */

  // motor holes
  position_motor() {
    translate([0,0,mount_plate_thickness/2]) {
      // motor shoulder
      cylinder(r=motor_shoulder_diam/2+1,h=mount_plate_thickness*2,center=true);

      // motor mounting holes
      for (x=[-1,1]) {
        for (y=[-1,1]) {
          translate([motor_hole_spacing/2*x,motor_hole_spacing/2*y,0]) {
            hole(m3_diam,mount_plate_thickness+1,8);
          }
        }
      }
    }
  }

  // filament guide retainer top recess
  /*
  translate([filament_x,filament_y,main_body_z+main_body_height/2])
    hole(6.25,15,8);
  */

  // hotend mount
  /*
  translate([filament_x,filament_y,hotend_z]) {
    translate([0,0,-hotend_retainer_height]) {
      hole(hotend_groove_diam,hotend_retainer_height*2,resolution);

      translate([0,total_depth/2,0]) {
        cube([hotend_groove_diam,total_depth,hotend_retainer_height*2],center=true);
      }
    }

    translate([0,0,-hotend_height_above_groove/2]) {
      hole(hotend_diam,hotend_height_above_groove,resolution);

      translate([0,total_depth/2,0]) {
        cube([hotend_diam,total_depth,hotend_height_above_groove],center=true);
      }
    }
  }
  */
}

module bridges(){
  bridge_thickness = extrusion_height;
  bridge_support_height = gear_side_bearing_y + bearing_height/2;

  // gear support bearing
  difference() {
    union() {
      translate([0,gear_side_bearing_y+bearing_height/2+bridge_thickness/2,0]) {
        cube([bearing_outer+0.5,bridge_thickness,bearing_opening+0.1],center=true);
      }

      translate([0,bridge_support_height/2,0]) {
        // gear-side bearing
        rotate([90,0,0]) {
          hole(bearing_opening-0.5,bridge_support_height);
        }
      }
    }

    translate([0,gear_side_bearing_y,0]) {
      // gear-side bearing
      rotate([90,0,0]) {
        hole(bearing_opening-5,bearing_height*2);
      }
    }
  }
}

module full_assembly() {
  assembly();

  translate([motor_x,-9,motor_z]) {
    rotate([-90,0,0]) {
      //small_gear();
    }
  }

  translate([0,-3,0]) {
    rotate([-90,0,0]) {
      rotate([180,0,0]) {
        rotate([0,0,0]) {
          //large_gear();
        }
      }
    }
  }
}

full_assembly();
mirror([0,1,0]) {
  mirror([0,0,1]) {
    //full_assembly();
  }
}
